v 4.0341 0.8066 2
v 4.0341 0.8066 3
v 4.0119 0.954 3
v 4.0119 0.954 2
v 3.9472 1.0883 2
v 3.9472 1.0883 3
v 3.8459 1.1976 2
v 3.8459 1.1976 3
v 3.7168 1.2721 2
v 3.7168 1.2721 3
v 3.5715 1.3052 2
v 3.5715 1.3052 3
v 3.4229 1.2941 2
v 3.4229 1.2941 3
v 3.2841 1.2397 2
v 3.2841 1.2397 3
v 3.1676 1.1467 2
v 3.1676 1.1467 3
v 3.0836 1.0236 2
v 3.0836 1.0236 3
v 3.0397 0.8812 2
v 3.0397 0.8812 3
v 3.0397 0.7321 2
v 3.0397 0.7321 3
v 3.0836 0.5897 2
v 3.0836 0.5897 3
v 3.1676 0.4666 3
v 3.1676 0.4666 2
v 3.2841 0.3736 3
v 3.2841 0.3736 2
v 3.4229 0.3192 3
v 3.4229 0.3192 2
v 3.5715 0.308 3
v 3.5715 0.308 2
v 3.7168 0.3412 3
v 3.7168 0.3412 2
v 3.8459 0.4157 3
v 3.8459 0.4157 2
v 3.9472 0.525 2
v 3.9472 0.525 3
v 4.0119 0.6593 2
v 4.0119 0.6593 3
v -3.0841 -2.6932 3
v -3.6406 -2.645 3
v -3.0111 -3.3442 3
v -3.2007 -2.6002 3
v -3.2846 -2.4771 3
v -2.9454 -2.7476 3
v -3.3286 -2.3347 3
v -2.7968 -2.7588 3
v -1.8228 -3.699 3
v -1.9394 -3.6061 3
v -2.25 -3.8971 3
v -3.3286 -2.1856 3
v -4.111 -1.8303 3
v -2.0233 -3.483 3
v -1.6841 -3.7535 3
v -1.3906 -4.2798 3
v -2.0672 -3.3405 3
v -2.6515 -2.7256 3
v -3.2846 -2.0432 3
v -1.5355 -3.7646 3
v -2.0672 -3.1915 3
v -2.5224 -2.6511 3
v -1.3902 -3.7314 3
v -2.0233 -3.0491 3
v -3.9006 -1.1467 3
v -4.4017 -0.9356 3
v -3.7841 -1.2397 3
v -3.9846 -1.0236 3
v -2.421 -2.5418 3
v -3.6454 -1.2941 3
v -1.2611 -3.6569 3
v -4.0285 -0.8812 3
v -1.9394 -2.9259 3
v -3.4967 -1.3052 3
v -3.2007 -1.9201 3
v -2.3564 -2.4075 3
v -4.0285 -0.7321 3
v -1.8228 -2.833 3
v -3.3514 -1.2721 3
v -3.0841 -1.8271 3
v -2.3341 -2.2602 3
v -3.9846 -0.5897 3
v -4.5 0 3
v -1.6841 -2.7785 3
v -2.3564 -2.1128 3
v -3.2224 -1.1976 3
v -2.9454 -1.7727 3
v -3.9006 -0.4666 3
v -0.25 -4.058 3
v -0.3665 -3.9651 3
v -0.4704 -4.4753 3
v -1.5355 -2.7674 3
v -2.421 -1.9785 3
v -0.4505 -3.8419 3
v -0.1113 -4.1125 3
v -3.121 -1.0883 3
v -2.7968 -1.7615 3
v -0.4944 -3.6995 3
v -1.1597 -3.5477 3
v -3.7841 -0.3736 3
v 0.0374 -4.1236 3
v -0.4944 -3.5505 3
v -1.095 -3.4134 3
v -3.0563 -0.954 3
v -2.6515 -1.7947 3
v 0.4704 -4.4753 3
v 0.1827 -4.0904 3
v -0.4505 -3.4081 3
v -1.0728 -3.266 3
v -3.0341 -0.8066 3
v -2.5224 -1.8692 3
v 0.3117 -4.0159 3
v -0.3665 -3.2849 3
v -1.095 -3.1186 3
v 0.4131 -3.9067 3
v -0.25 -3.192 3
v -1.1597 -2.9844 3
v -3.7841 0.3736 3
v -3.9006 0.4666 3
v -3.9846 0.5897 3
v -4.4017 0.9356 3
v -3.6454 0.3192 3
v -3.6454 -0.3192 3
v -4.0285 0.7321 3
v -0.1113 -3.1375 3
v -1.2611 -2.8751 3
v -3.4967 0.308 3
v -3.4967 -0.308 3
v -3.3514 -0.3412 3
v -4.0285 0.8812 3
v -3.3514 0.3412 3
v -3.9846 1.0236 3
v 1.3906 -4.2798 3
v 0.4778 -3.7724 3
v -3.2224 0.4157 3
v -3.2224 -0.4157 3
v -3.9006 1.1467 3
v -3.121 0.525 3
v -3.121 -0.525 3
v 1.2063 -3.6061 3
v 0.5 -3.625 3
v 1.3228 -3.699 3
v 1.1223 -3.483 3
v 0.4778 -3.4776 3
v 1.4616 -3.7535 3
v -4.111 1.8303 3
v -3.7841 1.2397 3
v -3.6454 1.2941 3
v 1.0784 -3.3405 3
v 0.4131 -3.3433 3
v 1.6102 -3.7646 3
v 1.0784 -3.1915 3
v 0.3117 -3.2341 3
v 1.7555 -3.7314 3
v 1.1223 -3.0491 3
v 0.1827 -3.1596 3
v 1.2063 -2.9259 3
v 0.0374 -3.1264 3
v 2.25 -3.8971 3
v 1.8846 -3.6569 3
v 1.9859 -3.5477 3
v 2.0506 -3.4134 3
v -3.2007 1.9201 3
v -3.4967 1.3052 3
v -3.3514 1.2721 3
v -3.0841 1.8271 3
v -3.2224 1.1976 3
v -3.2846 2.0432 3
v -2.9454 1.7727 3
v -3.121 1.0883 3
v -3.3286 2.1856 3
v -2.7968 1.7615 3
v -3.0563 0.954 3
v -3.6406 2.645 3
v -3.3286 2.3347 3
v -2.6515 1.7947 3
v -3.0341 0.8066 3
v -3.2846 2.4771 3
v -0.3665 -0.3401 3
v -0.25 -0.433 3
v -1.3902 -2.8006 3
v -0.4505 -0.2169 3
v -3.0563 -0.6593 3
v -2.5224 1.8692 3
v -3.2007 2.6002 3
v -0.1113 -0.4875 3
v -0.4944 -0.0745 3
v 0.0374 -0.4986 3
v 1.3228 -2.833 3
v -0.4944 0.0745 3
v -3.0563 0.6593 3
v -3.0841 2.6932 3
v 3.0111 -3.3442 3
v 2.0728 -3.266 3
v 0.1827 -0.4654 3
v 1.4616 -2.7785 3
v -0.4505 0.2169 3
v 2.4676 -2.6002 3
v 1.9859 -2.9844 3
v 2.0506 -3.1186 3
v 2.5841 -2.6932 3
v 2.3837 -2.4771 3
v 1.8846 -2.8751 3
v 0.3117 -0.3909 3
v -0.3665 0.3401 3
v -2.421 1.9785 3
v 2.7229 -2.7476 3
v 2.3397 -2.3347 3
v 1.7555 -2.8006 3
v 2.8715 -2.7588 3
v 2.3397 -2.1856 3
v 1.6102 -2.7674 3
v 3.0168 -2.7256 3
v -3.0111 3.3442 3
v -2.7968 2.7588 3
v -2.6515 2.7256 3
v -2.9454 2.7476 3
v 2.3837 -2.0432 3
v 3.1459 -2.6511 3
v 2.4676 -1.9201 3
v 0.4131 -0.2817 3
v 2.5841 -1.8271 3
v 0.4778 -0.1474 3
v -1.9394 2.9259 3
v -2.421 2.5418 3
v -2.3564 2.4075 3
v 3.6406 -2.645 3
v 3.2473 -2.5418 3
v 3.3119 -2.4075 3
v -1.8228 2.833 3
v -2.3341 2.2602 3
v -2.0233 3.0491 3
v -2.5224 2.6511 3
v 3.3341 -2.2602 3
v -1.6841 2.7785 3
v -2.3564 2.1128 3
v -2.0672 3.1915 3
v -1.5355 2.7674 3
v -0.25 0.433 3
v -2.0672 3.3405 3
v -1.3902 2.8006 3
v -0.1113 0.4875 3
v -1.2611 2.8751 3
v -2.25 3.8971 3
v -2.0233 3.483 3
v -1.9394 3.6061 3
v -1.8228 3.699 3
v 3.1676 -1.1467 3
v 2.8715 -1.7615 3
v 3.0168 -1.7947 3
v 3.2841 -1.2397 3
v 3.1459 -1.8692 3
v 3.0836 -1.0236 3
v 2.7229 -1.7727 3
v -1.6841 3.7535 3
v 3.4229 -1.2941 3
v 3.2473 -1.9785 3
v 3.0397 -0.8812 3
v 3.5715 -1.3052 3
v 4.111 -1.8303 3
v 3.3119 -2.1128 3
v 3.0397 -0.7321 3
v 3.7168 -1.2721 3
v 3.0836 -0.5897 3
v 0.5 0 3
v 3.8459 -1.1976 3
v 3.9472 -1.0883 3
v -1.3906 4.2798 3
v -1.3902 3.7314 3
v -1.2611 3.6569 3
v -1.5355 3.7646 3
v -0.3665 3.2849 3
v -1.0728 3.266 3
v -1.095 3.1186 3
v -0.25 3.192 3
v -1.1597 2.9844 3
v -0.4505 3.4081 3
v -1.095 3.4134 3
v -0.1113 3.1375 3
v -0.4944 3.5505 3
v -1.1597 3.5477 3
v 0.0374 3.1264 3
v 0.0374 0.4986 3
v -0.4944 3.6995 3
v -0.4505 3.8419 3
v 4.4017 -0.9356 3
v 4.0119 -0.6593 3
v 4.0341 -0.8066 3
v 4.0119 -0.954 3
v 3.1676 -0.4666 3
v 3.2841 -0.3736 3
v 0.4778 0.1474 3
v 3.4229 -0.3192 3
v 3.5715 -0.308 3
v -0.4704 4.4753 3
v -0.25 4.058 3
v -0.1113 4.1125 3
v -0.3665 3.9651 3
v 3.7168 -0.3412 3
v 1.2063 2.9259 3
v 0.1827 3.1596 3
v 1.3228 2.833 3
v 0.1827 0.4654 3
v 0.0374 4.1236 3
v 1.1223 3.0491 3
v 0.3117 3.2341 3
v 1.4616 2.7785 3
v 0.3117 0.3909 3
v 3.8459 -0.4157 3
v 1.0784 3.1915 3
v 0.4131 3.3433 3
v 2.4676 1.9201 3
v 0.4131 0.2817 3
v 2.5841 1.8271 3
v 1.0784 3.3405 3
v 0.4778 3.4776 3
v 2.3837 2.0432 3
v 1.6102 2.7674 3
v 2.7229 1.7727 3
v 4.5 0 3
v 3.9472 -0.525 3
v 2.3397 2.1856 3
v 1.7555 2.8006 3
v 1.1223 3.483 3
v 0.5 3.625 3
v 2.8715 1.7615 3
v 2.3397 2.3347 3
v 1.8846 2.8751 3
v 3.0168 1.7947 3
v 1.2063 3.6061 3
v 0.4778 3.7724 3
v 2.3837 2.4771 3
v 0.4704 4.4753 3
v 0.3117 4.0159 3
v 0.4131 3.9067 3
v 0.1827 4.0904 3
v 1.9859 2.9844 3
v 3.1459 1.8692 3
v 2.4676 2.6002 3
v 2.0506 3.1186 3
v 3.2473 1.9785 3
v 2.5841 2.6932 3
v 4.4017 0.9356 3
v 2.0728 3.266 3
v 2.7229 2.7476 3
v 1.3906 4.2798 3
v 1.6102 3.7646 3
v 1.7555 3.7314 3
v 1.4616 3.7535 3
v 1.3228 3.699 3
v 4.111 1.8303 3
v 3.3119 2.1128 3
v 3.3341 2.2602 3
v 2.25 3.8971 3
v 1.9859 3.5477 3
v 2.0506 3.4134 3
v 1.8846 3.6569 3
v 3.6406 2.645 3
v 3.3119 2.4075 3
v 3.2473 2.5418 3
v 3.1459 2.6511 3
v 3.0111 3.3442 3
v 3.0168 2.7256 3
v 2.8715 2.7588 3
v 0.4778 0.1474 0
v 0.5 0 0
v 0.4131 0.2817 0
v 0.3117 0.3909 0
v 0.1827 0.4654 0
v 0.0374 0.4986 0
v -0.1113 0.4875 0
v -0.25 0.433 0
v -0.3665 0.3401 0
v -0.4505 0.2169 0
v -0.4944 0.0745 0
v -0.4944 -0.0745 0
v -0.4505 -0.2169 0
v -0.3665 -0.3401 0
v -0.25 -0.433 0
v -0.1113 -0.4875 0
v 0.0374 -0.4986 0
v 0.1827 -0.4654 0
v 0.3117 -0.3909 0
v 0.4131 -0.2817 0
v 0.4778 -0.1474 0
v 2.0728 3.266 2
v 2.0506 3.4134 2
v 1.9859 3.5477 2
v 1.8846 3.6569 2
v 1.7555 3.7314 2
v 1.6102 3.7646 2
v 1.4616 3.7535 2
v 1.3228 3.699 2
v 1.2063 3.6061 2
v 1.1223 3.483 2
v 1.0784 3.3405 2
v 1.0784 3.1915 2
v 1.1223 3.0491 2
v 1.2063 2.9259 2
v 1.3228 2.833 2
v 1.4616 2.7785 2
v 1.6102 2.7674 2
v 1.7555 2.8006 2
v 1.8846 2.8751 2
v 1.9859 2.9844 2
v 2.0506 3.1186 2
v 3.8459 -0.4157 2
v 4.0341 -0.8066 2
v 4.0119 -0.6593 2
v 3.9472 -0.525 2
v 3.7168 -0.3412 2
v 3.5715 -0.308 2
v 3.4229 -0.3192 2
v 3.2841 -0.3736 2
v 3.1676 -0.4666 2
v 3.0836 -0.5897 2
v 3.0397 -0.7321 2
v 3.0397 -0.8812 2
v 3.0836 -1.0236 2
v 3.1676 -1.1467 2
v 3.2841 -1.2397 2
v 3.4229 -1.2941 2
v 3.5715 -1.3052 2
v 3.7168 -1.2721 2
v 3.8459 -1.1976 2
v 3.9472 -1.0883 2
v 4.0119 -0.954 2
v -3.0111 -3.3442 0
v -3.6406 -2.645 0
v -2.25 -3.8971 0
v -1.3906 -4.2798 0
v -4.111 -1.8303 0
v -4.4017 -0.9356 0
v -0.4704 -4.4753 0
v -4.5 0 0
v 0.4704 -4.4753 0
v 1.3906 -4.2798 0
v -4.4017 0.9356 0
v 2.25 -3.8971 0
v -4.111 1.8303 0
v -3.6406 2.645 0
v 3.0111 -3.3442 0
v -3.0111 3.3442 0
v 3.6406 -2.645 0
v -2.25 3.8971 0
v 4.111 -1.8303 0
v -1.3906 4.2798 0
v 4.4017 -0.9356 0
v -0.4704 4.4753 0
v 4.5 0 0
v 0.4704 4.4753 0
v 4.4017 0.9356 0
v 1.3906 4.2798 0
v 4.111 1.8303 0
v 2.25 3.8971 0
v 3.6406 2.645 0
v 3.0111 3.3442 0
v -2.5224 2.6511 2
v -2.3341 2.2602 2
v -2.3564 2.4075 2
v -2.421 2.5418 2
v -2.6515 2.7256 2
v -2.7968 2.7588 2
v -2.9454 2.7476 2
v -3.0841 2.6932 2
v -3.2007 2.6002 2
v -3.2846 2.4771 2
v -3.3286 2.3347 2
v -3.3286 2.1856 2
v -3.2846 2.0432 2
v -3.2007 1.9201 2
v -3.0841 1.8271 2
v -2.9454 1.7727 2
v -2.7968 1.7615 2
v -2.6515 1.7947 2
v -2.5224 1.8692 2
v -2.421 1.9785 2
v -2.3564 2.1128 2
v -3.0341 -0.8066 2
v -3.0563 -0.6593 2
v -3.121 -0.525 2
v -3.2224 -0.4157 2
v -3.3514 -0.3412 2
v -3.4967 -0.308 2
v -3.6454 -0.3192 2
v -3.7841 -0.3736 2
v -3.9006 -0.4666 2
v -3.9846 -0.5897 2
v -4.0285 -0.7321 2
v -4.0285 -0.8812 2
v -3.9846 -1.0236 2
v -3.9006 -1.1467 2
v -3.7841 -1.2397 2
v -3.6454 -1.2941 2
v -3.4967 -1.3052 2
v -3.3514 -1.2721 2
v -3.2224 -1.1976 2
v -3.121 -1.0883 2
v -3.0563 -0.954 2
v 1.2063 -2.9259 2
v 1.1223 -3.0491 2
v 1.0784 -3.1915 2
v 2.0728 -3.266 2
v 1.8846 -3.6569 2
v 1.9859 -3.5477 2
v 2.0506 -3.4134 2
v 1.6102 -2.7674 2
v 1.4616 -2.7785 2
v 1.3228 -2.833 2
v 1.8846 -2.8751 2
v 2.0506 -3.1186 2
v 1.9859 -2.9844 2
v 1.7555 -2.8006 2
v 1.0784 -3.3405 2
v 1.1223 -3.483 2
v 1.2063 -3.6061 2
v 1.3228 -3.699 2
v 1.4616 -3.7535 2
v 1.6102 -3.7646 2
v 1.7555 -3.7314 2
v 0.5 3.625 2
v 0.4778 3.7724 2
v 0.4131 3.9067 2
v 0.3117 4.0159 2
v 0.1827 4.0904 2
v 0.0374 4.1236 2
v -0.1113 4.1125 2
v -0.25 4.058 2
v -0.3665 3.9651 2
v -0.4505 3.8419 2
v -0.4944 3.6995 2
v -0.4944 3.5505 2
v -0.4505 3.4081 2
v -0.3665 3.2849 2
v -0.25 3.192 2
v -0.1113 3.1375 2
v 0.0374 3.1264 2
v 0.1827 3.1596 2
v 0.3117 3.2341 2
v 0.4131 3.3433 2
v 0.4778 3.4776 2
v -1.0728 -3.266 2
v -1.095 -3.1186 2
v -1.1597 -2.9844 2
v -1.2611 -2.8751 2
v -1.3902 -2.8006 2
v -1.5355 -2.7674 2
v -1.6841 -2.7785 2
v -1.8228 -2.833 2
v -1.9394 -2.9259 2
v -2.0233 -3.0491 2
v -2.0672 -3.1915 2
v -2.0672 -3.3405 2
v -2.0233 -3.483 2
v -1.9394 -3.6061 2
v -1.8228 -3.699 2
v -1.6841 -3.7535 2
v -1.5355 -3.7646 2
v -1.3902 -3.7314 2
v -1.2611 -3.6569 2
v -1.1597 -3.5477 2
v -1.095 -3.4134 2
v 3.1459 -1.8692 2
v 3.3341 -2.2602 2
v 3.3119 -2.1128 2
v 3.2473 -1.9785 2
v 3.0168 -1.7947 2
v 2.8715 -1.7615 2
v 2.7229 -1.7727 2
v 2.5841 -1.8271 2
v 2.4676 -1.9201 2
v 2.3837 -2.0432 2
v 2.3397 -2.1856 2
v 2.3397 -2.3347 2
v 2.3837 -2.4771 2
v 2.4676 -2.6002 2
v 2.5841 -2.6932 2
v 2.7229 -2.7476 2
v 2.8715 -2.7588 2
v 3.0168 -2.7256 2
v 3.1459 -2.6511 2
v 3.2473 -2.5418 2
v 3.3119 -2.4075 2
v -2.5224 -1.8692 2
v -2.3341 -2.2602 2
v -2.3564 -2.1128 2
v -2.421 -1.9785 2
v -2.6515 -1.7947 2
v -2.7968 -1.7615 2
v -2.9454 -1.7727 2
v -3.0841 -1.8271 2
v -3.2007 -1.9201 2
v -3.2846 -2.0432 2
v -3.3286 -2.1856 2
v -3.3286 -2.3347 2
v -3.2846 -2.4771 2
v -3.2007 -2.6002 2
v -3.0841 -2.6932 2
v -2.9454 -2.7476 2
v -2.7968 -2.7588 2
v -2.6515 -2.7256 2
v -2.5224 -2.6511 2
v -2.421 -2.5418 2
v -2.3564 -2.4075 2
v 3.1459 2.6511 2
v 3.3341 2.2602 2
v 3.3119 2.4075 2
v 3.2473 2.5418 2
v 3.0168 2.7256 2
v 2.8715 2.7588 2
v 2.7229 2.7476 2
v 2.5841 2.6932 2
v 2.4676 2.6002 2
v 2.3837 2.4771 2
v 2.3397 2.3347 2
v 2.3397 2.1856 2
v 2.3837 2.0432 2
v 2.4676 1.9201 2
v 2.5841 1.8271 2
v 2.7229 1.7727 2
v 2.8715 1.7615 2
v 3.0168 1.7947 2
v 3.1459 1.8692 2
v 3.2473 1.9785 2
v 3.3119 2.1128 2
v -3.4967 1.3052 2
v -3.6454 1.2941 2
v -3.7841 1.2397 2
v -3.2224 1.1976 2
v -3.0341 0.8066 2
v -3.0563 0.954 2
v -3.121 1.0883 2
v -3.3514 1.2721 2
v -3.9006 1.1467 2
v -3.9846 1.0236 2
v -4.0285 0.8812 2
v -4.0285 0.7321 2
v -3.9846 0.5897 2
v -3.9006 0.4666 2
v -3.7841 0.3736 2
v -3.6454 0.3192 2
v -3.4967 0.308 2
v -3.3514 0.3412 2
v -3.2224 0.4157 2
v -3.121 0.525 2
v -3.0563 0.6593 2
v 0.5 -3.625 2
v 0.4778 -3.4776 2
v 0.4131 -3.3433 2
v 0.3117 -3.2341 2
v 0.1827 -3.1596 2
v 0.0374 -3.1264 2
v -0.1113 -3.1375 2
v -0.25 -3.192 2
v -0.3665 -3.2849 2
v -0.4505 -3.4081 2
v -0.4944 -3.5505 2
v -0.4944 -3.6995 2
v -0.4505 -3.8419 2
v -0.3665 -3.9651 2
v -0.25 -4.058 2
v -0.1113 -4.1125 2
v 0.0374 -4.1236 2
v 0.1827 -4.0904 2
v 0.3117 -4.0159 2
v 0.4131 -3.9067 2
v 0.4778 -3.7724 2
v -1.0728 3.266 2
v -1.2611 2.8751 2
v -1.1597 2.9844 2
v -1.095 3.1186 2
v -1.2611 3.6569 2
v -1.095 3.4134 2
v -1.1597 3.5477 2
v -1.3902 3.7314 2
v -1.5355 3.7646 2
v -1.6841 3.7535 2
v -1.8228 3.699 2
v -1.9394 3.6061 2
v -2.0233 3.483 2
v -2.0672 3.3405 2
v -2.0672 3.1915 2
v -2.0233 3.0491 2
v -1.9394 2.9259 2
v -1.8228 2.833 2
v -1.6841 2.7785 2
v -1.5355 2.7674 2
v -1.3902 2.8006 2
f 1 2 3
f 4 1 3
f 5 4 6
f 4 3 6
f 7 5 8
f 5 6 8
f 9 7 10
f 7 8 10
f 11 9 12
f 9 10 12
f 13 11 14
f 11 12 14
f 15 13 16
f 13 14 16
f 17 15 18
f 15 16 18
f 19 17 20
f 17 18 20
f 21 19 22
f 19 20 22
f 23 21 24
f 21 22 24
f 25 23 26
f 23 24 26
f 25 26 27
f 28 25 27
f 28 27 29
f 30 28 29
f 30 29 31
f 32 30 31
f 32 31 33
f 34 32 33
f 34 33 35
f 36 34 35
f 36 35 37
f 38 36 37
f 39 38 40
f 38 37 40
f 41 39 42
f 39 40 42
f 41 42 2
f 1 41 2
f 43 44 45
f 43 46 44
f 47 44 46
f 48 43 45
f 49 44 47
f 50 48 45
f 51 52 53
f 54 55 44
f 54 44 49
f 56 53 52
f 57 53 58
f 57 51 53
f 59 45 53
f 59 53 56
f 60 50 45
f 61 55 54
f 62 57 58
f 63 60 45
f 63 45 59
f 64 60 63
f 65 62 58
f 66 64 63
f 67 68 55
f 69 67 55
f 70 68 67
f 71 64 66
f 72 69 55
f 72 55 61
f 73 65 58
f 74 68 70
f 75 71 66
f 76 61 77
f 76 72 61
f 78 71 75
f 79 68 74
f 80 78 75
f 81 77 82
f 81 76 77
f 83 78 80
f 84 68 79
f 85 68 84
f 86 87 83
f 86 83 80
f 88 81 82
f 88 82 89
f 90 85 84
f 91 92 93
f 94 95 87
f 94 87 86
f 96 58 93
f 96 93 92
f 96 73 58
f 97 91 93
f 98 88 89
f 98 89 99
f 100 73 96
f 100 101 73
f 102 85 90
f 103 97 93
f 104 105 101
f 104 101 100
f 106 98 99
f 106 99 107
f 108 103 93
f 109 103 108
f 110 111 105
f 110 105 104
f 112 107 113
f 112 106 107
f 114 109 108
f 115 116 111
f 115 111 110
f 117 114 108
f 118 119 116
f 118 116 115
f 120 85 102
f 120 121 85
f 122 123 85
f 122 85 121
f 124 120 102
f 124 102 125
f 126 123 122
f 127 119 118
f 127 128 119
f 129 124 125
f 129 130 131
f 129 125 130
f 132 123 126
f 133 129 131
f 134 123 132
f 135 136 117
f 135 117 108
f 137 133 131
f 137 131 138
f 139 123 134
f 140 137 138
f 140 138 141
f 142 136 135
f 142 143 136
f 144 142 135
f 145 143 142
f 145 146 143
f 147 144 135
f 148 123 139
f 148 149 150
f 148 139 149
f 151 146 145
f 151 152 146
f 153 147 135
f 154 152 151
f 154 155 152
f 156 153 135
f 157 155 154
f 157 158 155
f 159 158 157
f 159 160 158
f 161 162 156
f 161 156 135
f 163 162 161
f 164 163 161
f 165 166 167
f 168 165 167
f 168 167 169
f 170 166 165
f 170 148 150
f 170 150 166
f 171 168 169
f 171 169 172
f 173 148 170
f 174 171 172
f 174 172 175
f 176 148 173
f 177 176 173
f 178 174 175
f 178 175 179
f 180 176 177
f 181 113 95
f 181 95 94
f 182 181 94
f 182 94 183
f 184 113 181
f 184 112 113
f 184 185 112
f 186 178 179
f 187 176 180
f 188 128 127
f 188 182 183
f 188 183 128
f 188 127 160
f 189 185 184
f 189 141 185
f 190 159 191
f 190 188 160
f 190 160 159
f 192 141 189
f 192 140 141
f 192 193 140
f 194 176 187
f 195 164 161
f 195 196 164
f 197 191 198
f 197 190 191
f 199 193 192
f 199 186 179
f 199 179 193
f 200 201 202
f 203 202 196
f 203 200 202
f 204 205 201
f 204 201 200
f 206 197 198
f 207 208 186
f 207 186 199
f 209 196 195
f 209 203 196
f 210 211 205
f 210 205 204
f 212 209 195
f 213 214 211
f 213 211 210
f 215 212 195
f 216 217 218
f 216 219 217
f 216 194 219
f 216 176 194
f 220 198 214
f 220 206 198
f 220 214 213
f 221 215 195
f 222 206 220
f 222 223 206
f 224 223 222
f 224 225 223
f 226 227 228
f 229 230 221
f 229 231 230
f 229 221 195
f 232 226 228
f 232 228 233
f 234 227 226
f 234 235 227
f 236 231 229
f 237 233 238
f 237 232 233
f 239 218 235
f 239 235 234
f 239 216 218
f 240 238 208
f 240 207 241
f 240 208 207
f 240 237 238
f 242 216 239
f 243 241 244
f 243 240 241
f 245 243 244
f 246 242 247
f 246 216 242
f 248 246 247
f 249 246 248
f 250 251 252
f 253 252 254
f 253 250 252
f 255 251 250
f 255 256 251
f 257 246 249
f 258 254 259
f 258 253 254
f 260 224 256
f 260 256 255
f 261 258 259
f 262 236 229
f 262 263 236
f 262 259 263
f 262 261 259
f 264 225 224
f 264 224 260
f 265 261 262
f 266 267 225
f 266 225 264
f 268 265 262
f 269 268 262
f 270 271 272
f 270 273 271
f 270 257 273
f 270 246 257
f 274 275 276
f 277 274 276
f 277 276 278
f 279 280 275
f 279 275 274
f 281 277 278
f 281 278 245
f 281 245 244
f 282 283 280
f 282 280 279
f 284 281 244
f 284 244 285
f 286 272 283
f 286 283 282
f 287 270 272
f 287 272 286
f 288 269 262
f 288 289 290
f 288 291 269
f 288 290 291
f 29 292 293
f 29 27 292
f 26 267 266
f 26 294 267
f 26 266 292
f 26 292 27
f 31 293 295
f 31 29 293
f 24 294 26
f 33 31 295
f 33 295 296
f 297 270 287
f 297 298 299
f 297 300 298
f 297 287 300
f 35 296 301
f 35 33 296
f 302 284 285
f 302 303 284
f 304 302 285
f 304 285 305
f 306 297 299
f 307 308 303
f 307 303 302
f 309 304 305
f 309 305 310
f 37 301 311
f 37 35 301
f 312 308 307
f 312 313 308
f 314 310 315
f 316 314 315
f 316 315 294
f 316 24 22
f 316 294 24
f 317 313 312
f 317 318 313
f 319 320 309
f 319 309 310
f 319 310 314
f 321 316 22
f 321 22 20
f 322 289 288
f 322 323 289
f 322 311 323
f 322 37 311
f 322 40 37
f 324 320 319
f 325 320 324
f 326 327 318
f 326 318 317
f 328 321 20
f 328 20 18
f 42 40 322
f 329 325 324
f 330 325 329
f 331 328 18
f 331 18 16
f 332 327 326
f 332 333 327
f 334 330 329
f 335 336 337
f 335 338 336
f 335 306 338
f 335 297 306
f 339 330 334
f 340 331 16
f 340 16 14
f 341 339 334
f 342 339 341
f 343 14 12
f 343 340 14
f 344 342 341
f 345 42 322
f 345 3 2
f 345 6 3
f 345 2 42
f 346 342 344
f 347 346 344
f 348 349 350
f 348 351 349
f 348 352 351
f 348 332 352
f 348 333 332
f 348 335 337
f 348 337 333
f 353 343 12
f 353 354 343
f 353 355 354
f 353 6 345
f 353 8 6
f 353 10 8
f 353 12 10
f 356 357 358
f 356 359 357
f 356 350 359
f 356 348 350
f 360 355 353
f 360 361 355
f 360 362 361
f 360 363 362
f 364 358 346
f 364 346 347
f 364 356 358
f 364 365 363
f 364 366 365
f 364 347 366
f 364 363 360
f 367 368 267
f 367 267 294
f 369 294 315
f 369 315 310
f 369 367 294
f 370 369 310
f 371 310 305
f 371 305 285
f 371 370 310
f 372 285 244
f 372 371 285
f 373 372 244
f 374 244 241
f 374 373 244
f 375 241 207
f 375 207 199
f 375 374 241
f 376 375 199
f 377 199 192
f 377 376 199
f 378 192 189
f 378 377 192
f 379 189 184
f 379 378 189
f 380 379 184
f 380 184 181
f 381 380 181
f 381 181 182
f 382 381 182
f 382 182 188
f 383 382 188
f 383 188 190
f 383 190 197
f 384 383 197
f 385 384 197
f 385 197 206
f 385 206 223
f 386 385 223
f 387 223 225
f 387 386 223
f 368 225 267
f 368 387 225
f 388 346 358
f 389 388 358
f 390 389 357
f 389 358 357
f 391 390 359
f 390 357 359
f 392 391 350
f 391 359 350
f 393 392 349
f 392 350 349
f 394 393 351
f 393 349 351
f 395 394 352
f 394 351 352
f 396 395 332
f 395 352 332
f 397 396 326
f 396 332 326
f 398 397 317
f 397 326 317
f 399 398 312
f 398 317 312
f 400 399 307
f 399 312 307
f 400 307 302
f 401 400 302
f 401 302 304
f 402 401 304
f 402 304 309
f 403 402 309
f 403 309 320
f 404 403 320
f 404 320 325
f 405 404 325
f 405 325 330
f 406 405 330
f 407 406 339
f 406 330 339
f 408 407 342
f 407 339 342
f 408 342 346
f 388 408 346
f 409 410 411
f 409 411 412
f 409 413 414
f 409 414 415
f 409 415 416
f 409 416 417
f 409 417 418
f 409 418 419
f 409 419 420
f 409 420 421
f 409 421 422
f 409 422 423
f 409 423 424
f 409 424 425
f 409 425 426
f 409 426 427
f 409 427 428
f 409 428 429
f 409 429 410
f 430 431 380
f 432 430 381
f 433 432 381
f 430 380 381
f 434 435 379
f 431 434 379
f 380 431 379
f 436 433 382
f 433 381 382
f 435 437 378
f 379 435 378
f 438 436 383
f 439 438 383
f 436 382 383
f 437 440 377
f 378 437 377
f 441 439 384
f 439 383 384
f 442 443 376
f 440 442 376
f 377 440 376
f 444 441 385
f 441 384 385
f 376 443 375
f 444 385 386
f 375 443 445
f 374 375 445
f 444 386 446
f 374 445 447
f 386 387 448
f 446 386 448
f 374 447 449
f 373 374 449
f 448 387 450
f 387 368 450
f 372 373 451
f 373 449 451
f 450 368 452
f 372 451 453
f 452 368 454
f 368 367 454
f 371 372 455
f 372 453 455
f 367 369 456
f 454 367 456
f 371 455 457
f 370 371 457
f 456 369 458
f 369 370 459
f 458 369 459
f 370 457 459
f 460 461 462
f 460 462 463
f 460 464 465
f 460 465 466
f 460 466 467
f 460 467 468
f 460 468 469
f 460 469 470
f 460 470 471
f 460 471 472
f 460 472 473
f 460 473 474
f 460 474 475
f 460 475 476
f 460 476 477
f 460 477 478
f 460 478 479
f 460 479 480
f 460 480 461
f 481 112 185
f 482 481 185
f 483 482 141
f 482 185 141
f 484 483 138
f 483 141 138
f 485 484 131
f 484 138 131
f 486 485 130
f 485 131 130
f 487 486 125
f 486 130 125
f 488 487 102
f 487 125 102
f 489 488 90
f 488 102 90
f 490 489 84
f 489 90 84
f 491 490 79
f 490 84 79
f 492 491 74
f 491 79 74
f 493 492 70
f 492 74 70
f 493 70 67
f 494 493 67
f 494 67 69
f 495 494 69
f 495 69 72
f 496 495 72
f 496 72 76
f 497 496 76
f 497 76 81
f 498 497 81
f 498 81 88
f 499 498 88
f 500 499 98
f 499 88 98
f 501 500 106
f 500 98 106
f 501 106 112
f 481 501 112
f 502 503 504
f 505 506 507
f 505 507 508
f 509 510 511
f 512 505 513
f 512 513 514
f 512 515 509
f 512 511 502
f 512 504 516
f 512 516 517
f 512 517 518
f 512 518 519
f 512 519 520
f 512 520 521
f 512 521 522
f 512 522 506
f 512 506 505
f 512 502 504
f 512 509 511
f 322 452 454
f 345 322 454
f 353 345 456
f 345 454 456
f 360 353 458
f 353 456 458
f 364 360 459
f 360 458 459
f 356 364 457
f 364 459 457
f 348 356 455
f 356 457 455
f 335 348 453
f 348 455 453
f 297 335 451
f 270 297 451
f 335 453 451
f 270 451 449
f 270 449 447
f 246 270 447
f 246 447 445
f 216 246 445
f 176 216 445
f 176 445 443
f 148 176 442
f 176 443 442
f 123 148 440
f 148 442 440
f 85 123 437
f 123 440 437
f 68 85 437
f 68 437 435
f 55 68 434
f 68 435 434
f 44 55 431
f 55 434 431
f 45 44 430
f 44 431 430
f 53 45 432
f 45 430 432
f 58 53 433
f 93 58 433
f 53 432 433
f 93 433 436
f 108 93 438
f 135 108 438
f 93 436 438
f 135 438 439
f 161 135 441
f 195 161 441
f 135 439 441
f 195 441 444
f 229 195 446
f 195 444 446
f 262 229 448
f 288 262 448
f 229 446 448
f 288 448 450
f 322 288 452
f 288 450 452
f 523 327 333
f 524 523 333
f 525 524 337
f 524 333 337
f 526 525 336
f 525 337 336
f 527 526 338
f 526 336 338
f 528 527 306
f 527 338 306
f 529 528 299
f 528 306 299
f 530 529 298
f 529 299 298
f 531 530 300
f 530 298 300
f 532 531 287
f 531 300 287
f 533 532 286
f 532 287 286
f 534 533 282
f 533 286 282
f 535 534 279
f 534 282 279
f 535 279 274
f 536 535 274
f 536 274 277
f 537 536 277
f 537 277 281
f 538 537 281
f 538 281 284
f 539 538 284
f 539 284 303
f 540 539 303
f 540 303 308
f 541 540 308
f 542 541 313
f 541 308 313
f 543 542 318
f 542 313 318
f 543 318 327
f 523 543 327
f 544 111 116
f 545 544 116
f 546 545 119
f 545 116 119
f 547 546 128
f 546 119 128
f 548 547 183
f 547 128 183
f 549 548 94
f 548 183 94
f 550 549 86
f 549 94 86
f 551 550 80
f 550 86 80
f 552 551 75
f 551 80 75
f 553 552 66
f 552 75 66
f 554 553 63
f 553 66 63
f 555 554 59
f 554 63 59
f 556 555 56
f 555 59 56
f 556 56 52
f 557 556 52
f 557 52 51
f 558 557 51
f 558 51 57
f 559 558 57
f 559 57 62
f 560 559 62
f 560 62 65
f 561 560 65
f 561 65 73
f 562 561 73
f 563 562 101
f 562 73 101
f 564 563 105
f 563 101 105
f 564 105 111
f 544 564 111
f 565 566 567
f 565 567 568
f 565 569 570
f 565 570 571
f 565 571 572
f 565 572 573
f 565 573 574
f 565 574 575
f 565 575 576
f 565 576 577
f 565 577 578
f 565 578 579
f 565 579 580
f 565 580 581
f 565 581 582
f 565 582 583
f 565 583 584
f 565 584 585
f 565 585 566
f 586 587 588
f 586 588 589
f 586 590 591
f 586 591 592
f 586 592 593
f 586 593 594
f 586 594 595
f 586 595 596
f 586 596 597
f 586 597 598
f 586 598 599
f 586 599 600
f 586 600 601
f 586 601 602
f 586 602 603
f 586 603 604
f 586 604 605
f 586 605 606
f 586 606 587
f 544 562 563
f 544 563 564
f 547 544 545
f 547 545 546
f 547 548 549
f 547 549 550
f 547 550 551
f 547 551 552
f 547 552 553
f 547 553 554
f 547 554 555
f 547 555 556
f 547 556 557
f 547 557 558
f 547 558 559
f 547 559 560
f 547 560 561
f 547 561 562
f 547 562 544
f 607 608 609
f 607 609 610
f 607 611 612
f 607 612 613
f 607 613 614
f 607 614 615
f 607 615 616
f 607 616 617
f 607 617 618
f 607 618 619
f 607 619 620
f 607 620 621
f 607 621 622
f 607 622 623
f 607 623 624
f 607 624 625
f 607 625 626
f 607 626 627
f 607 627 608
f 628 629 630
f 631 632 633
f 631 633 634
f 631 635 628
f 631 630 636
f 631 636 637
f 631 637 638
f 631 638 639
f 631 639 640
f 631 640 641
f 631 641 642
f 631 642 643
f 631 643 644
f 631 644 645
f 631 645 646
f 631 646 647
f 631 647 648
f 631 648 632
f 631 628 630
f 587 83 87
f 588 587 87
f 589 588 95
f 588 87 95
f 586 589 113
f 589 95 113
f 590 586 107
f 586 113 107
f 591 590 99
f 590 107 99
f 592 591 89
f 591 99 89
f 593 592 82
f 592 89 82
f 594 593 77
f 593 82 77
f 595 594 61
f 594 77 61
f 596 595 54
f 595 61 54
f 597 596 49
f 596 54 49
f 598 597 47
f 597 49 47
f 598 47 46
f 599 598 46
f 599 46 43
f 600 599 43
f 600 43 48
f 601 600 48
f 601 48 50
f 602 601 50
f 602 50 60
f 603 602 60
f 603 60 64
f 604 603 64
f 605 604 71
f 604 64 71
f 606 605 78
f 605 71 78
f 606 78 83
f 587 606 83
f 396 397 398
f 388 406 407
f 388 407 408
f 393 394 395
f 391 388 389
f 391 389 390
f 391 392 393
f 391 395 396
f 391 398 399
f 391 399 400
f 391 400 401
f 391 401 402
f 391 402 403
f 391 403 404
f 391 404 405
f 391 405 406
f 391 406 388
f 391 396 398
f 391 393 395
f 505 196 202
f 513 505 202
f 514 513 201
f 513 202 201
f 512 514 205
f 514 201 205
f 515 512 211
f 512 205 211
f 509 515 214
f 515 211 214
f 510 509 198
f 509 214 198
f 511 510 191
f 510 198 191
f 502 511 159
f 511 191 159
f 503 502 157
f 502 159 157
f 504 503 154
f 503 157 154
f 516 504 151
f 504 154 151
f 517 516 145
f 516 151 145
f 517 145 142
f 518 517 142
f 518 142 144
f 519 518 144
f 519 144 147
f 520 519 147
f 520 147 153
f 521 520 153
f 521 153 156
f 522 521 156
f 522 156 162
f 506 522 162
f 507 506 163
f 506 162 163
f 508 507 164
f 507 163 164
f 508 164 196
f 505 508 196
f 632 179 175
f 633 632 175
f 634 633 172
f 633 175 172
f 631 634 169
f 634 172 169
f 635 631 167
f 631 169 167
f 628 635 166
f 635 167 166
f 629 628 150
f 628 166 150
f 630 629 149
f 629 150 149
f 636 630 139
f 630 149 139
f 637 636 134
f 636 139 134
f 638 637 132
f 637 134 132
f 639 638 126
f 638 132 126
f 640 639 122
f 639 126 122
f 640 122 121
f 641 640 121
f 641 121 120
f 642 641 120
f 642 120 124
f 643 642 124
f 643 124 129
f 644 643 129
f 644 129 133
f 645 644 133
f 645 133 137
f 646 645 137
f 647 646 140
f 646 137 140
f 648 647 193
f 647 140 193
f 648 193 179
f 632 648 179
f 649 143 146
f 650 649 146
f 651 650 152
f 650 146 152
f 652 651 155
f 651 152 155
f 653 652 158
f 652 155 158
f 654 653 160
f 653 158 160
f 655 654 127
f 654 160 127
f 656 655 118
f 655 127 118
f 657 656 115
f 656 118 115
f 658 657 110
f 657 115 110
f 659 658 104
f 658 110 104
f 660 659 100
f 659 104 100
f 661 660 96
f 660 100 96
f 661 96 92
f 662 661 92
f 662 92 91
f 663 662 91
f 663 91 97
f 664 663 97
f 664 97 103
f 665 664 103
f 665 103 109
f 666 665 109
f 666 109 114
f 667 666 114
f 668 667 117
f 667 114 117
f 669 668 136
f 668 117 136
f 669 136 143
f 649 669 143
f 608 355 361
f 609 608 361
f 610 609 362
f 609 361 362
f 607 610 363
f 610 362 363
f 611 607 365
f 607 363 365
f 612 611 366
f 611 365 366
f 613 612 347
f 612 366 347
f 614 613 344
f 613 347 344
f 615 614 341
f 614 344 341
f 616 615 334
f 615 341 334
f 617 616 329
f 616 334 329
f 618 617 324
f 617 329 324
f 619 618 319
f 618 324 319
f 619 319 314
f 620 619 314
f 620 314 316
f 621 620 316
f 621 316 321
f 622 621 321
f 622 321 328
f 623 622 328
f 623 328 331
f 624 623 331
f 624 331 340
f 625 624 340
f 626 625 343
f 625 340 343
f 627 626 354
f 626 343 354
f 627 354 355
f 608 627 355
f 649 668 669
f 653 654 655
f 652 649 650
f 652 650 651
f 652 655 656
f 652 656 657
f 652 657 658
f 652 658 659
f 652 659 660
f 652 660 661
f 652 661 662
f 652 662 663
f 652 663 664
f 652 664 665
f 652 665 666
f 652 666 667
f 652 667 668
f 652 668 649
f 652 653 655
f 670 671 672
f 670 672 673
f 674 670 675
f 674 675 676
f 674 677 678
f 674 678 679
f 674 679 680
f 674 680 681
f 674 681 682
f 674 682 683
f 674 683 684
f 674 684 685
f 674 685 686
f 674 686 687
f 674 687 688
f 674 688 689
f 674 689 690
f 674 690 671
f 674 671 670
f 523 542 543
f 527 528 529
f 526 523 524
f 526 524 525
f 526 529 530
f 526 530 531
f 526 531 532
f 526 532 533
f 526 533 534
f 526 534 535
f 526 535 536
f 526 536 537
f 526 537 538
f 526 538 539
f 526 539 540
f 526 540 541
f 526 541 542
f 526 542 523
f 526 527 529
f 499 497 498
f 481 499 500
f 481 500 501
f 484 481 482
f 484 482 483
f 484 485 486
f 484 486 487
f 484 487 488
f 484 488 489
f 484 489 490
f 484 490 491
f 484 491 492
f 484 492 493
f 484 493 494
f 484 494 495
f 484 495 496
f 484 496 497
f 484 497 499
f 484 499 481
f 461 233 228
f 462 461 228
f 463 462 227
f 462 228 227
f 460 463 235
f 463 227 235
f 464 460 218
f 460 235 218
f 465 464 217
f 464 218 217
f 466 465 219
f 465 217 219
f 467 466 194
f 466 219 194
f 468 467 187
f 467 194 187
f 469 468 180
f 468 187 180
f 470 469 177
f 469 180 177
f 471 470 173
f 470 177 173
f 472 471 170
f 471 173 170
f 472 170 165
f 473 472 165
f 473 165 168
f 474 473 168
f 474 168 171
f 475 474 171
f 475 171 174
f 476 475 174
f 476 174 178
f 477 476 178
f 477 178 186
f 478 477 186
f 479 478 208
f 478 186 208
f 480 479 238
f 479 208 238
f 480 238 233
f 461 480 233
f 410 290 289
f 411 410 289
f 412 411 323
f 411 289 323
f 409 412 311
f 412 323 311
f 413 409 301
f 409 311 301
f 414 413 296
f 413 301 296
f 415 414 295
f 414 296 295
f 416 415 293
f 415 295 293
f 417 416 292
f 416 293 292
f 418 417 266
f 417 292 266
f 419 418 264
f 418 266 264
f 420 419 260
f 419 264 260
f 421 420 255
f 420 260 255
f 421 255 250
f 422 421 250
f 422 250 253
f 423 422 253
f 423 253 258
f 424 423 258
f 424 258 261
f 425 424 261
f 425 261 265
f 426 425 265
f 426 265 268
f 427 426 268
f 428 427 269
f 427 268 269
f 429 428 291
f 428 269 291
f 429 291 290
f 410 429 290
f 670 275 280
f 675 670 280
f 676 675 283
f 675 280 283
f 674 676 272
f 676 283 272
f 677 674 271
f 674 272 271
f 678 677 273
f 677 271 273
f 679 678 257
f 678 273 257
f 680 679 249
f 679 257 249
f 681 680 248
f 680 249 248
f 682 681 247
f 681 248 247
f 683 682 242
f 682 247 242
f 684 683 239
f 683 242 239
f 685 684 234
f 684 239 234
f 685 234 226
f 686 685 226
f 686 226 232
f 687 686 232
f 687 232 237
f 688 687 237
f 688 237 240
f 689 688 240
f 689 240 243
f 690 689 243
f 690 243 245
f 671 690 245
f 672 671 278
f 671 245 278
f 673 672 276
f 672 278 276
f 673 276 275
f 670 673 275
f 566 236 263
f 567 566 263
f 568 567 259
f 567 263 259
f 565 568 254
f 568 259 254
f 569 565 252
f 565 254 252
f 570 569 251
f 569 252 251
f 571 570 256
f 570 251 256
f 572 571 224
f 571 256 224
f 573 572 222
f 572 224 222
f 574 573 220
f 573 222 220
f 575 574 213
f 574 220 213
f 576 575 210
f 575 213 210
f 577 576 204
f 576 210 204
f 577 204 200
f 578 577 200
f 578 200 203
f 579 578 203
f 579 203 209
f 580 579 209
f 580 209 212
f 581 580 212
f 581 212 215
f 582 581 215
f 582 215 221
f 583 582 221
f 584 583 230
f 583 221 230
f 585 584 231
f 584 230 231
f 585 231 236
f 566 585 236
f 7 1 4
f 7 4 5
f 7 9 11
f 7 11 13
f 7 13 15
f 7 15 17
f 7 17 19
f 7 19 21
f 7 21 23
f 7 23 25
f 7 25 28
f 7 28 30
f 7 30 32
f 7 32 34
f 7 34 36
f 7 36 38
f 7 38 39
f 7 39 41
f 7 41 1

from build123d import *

# Parameters (mm, degrees)
SZKIC1_R                    = 4.5
SZKIC1_R_2                  = 0.5
DODANIE_WYCI_GNI_CIE1_DEPTH = 3
SZKIC2_R                    = 0.5
WYTNIJ_WYCI_GNI_CIE1_DEPTH  = 1


with BuildPart() as part:
    # Szkic1 → Dodanie-wyciągnięcie1 (new body)
    with BuildSketch(Plane.XY):
        Circle(SZKIC1_R)
        Circle(SZKIC1_R_2, mode=Mode.SUBTRACT)
    extrude(amount=DODANIE_WYCI_GNI_CIE1_DEPTH)

    # Szkic2 → Wytnij-wyciągnięcie1 (cut)
    with BuildSketch(Plane.XY.offset(3)):
        with Locations((0, 3.625)):
            Circle(SZKIC2_R)
        with Locations((1.572828554, 3.266012146)):
            Circle(SZKIC2_R)
        with Locations((2.834139124, 2.260150532)):
            Circle(SZKIC2_R)
        with Locations((3.534113682, 0.806638386)):
            Circle(SZKIC2_R)
        with Locations((3.534113682, -0.806638386)):
            Circle(SZKIC2_R)
        with Locations((2.834139124, -2.260150532)):
            Circle(SZKIC2_R)
        with Locations((1.572828554, -3.266012146)):
            Circle(SZKIC2_R)
        with Locations((0, -3.625)):
            Circle(SZKIC2_R)
        with Locations((-1.572828554, -3.266012146)):
            Circle(SZKIC2_R)
        with Locations((-2.834139124, -2.260150532)):
            Circle(SZKIC2_R)
        with Locations((-3.534113682, -0.806638386)):
            Circle(SZKIC2_R)
        with Locations((-3.534113682, 0.806638386)):
            Circle(SZKIC2_R)
        with Locations((-2.834139124, 2.260150532)):
            Circle(SZKIC2_R)
        with Locations((-1.572828554, 3.266012146)):
            Circle(SZKIC2_R)
    extrude(amount=-WYTNIJ_WYCI_GNI_CIE1_DEPTH, mode=Mode.SUBTRACT)


solid = part.part
